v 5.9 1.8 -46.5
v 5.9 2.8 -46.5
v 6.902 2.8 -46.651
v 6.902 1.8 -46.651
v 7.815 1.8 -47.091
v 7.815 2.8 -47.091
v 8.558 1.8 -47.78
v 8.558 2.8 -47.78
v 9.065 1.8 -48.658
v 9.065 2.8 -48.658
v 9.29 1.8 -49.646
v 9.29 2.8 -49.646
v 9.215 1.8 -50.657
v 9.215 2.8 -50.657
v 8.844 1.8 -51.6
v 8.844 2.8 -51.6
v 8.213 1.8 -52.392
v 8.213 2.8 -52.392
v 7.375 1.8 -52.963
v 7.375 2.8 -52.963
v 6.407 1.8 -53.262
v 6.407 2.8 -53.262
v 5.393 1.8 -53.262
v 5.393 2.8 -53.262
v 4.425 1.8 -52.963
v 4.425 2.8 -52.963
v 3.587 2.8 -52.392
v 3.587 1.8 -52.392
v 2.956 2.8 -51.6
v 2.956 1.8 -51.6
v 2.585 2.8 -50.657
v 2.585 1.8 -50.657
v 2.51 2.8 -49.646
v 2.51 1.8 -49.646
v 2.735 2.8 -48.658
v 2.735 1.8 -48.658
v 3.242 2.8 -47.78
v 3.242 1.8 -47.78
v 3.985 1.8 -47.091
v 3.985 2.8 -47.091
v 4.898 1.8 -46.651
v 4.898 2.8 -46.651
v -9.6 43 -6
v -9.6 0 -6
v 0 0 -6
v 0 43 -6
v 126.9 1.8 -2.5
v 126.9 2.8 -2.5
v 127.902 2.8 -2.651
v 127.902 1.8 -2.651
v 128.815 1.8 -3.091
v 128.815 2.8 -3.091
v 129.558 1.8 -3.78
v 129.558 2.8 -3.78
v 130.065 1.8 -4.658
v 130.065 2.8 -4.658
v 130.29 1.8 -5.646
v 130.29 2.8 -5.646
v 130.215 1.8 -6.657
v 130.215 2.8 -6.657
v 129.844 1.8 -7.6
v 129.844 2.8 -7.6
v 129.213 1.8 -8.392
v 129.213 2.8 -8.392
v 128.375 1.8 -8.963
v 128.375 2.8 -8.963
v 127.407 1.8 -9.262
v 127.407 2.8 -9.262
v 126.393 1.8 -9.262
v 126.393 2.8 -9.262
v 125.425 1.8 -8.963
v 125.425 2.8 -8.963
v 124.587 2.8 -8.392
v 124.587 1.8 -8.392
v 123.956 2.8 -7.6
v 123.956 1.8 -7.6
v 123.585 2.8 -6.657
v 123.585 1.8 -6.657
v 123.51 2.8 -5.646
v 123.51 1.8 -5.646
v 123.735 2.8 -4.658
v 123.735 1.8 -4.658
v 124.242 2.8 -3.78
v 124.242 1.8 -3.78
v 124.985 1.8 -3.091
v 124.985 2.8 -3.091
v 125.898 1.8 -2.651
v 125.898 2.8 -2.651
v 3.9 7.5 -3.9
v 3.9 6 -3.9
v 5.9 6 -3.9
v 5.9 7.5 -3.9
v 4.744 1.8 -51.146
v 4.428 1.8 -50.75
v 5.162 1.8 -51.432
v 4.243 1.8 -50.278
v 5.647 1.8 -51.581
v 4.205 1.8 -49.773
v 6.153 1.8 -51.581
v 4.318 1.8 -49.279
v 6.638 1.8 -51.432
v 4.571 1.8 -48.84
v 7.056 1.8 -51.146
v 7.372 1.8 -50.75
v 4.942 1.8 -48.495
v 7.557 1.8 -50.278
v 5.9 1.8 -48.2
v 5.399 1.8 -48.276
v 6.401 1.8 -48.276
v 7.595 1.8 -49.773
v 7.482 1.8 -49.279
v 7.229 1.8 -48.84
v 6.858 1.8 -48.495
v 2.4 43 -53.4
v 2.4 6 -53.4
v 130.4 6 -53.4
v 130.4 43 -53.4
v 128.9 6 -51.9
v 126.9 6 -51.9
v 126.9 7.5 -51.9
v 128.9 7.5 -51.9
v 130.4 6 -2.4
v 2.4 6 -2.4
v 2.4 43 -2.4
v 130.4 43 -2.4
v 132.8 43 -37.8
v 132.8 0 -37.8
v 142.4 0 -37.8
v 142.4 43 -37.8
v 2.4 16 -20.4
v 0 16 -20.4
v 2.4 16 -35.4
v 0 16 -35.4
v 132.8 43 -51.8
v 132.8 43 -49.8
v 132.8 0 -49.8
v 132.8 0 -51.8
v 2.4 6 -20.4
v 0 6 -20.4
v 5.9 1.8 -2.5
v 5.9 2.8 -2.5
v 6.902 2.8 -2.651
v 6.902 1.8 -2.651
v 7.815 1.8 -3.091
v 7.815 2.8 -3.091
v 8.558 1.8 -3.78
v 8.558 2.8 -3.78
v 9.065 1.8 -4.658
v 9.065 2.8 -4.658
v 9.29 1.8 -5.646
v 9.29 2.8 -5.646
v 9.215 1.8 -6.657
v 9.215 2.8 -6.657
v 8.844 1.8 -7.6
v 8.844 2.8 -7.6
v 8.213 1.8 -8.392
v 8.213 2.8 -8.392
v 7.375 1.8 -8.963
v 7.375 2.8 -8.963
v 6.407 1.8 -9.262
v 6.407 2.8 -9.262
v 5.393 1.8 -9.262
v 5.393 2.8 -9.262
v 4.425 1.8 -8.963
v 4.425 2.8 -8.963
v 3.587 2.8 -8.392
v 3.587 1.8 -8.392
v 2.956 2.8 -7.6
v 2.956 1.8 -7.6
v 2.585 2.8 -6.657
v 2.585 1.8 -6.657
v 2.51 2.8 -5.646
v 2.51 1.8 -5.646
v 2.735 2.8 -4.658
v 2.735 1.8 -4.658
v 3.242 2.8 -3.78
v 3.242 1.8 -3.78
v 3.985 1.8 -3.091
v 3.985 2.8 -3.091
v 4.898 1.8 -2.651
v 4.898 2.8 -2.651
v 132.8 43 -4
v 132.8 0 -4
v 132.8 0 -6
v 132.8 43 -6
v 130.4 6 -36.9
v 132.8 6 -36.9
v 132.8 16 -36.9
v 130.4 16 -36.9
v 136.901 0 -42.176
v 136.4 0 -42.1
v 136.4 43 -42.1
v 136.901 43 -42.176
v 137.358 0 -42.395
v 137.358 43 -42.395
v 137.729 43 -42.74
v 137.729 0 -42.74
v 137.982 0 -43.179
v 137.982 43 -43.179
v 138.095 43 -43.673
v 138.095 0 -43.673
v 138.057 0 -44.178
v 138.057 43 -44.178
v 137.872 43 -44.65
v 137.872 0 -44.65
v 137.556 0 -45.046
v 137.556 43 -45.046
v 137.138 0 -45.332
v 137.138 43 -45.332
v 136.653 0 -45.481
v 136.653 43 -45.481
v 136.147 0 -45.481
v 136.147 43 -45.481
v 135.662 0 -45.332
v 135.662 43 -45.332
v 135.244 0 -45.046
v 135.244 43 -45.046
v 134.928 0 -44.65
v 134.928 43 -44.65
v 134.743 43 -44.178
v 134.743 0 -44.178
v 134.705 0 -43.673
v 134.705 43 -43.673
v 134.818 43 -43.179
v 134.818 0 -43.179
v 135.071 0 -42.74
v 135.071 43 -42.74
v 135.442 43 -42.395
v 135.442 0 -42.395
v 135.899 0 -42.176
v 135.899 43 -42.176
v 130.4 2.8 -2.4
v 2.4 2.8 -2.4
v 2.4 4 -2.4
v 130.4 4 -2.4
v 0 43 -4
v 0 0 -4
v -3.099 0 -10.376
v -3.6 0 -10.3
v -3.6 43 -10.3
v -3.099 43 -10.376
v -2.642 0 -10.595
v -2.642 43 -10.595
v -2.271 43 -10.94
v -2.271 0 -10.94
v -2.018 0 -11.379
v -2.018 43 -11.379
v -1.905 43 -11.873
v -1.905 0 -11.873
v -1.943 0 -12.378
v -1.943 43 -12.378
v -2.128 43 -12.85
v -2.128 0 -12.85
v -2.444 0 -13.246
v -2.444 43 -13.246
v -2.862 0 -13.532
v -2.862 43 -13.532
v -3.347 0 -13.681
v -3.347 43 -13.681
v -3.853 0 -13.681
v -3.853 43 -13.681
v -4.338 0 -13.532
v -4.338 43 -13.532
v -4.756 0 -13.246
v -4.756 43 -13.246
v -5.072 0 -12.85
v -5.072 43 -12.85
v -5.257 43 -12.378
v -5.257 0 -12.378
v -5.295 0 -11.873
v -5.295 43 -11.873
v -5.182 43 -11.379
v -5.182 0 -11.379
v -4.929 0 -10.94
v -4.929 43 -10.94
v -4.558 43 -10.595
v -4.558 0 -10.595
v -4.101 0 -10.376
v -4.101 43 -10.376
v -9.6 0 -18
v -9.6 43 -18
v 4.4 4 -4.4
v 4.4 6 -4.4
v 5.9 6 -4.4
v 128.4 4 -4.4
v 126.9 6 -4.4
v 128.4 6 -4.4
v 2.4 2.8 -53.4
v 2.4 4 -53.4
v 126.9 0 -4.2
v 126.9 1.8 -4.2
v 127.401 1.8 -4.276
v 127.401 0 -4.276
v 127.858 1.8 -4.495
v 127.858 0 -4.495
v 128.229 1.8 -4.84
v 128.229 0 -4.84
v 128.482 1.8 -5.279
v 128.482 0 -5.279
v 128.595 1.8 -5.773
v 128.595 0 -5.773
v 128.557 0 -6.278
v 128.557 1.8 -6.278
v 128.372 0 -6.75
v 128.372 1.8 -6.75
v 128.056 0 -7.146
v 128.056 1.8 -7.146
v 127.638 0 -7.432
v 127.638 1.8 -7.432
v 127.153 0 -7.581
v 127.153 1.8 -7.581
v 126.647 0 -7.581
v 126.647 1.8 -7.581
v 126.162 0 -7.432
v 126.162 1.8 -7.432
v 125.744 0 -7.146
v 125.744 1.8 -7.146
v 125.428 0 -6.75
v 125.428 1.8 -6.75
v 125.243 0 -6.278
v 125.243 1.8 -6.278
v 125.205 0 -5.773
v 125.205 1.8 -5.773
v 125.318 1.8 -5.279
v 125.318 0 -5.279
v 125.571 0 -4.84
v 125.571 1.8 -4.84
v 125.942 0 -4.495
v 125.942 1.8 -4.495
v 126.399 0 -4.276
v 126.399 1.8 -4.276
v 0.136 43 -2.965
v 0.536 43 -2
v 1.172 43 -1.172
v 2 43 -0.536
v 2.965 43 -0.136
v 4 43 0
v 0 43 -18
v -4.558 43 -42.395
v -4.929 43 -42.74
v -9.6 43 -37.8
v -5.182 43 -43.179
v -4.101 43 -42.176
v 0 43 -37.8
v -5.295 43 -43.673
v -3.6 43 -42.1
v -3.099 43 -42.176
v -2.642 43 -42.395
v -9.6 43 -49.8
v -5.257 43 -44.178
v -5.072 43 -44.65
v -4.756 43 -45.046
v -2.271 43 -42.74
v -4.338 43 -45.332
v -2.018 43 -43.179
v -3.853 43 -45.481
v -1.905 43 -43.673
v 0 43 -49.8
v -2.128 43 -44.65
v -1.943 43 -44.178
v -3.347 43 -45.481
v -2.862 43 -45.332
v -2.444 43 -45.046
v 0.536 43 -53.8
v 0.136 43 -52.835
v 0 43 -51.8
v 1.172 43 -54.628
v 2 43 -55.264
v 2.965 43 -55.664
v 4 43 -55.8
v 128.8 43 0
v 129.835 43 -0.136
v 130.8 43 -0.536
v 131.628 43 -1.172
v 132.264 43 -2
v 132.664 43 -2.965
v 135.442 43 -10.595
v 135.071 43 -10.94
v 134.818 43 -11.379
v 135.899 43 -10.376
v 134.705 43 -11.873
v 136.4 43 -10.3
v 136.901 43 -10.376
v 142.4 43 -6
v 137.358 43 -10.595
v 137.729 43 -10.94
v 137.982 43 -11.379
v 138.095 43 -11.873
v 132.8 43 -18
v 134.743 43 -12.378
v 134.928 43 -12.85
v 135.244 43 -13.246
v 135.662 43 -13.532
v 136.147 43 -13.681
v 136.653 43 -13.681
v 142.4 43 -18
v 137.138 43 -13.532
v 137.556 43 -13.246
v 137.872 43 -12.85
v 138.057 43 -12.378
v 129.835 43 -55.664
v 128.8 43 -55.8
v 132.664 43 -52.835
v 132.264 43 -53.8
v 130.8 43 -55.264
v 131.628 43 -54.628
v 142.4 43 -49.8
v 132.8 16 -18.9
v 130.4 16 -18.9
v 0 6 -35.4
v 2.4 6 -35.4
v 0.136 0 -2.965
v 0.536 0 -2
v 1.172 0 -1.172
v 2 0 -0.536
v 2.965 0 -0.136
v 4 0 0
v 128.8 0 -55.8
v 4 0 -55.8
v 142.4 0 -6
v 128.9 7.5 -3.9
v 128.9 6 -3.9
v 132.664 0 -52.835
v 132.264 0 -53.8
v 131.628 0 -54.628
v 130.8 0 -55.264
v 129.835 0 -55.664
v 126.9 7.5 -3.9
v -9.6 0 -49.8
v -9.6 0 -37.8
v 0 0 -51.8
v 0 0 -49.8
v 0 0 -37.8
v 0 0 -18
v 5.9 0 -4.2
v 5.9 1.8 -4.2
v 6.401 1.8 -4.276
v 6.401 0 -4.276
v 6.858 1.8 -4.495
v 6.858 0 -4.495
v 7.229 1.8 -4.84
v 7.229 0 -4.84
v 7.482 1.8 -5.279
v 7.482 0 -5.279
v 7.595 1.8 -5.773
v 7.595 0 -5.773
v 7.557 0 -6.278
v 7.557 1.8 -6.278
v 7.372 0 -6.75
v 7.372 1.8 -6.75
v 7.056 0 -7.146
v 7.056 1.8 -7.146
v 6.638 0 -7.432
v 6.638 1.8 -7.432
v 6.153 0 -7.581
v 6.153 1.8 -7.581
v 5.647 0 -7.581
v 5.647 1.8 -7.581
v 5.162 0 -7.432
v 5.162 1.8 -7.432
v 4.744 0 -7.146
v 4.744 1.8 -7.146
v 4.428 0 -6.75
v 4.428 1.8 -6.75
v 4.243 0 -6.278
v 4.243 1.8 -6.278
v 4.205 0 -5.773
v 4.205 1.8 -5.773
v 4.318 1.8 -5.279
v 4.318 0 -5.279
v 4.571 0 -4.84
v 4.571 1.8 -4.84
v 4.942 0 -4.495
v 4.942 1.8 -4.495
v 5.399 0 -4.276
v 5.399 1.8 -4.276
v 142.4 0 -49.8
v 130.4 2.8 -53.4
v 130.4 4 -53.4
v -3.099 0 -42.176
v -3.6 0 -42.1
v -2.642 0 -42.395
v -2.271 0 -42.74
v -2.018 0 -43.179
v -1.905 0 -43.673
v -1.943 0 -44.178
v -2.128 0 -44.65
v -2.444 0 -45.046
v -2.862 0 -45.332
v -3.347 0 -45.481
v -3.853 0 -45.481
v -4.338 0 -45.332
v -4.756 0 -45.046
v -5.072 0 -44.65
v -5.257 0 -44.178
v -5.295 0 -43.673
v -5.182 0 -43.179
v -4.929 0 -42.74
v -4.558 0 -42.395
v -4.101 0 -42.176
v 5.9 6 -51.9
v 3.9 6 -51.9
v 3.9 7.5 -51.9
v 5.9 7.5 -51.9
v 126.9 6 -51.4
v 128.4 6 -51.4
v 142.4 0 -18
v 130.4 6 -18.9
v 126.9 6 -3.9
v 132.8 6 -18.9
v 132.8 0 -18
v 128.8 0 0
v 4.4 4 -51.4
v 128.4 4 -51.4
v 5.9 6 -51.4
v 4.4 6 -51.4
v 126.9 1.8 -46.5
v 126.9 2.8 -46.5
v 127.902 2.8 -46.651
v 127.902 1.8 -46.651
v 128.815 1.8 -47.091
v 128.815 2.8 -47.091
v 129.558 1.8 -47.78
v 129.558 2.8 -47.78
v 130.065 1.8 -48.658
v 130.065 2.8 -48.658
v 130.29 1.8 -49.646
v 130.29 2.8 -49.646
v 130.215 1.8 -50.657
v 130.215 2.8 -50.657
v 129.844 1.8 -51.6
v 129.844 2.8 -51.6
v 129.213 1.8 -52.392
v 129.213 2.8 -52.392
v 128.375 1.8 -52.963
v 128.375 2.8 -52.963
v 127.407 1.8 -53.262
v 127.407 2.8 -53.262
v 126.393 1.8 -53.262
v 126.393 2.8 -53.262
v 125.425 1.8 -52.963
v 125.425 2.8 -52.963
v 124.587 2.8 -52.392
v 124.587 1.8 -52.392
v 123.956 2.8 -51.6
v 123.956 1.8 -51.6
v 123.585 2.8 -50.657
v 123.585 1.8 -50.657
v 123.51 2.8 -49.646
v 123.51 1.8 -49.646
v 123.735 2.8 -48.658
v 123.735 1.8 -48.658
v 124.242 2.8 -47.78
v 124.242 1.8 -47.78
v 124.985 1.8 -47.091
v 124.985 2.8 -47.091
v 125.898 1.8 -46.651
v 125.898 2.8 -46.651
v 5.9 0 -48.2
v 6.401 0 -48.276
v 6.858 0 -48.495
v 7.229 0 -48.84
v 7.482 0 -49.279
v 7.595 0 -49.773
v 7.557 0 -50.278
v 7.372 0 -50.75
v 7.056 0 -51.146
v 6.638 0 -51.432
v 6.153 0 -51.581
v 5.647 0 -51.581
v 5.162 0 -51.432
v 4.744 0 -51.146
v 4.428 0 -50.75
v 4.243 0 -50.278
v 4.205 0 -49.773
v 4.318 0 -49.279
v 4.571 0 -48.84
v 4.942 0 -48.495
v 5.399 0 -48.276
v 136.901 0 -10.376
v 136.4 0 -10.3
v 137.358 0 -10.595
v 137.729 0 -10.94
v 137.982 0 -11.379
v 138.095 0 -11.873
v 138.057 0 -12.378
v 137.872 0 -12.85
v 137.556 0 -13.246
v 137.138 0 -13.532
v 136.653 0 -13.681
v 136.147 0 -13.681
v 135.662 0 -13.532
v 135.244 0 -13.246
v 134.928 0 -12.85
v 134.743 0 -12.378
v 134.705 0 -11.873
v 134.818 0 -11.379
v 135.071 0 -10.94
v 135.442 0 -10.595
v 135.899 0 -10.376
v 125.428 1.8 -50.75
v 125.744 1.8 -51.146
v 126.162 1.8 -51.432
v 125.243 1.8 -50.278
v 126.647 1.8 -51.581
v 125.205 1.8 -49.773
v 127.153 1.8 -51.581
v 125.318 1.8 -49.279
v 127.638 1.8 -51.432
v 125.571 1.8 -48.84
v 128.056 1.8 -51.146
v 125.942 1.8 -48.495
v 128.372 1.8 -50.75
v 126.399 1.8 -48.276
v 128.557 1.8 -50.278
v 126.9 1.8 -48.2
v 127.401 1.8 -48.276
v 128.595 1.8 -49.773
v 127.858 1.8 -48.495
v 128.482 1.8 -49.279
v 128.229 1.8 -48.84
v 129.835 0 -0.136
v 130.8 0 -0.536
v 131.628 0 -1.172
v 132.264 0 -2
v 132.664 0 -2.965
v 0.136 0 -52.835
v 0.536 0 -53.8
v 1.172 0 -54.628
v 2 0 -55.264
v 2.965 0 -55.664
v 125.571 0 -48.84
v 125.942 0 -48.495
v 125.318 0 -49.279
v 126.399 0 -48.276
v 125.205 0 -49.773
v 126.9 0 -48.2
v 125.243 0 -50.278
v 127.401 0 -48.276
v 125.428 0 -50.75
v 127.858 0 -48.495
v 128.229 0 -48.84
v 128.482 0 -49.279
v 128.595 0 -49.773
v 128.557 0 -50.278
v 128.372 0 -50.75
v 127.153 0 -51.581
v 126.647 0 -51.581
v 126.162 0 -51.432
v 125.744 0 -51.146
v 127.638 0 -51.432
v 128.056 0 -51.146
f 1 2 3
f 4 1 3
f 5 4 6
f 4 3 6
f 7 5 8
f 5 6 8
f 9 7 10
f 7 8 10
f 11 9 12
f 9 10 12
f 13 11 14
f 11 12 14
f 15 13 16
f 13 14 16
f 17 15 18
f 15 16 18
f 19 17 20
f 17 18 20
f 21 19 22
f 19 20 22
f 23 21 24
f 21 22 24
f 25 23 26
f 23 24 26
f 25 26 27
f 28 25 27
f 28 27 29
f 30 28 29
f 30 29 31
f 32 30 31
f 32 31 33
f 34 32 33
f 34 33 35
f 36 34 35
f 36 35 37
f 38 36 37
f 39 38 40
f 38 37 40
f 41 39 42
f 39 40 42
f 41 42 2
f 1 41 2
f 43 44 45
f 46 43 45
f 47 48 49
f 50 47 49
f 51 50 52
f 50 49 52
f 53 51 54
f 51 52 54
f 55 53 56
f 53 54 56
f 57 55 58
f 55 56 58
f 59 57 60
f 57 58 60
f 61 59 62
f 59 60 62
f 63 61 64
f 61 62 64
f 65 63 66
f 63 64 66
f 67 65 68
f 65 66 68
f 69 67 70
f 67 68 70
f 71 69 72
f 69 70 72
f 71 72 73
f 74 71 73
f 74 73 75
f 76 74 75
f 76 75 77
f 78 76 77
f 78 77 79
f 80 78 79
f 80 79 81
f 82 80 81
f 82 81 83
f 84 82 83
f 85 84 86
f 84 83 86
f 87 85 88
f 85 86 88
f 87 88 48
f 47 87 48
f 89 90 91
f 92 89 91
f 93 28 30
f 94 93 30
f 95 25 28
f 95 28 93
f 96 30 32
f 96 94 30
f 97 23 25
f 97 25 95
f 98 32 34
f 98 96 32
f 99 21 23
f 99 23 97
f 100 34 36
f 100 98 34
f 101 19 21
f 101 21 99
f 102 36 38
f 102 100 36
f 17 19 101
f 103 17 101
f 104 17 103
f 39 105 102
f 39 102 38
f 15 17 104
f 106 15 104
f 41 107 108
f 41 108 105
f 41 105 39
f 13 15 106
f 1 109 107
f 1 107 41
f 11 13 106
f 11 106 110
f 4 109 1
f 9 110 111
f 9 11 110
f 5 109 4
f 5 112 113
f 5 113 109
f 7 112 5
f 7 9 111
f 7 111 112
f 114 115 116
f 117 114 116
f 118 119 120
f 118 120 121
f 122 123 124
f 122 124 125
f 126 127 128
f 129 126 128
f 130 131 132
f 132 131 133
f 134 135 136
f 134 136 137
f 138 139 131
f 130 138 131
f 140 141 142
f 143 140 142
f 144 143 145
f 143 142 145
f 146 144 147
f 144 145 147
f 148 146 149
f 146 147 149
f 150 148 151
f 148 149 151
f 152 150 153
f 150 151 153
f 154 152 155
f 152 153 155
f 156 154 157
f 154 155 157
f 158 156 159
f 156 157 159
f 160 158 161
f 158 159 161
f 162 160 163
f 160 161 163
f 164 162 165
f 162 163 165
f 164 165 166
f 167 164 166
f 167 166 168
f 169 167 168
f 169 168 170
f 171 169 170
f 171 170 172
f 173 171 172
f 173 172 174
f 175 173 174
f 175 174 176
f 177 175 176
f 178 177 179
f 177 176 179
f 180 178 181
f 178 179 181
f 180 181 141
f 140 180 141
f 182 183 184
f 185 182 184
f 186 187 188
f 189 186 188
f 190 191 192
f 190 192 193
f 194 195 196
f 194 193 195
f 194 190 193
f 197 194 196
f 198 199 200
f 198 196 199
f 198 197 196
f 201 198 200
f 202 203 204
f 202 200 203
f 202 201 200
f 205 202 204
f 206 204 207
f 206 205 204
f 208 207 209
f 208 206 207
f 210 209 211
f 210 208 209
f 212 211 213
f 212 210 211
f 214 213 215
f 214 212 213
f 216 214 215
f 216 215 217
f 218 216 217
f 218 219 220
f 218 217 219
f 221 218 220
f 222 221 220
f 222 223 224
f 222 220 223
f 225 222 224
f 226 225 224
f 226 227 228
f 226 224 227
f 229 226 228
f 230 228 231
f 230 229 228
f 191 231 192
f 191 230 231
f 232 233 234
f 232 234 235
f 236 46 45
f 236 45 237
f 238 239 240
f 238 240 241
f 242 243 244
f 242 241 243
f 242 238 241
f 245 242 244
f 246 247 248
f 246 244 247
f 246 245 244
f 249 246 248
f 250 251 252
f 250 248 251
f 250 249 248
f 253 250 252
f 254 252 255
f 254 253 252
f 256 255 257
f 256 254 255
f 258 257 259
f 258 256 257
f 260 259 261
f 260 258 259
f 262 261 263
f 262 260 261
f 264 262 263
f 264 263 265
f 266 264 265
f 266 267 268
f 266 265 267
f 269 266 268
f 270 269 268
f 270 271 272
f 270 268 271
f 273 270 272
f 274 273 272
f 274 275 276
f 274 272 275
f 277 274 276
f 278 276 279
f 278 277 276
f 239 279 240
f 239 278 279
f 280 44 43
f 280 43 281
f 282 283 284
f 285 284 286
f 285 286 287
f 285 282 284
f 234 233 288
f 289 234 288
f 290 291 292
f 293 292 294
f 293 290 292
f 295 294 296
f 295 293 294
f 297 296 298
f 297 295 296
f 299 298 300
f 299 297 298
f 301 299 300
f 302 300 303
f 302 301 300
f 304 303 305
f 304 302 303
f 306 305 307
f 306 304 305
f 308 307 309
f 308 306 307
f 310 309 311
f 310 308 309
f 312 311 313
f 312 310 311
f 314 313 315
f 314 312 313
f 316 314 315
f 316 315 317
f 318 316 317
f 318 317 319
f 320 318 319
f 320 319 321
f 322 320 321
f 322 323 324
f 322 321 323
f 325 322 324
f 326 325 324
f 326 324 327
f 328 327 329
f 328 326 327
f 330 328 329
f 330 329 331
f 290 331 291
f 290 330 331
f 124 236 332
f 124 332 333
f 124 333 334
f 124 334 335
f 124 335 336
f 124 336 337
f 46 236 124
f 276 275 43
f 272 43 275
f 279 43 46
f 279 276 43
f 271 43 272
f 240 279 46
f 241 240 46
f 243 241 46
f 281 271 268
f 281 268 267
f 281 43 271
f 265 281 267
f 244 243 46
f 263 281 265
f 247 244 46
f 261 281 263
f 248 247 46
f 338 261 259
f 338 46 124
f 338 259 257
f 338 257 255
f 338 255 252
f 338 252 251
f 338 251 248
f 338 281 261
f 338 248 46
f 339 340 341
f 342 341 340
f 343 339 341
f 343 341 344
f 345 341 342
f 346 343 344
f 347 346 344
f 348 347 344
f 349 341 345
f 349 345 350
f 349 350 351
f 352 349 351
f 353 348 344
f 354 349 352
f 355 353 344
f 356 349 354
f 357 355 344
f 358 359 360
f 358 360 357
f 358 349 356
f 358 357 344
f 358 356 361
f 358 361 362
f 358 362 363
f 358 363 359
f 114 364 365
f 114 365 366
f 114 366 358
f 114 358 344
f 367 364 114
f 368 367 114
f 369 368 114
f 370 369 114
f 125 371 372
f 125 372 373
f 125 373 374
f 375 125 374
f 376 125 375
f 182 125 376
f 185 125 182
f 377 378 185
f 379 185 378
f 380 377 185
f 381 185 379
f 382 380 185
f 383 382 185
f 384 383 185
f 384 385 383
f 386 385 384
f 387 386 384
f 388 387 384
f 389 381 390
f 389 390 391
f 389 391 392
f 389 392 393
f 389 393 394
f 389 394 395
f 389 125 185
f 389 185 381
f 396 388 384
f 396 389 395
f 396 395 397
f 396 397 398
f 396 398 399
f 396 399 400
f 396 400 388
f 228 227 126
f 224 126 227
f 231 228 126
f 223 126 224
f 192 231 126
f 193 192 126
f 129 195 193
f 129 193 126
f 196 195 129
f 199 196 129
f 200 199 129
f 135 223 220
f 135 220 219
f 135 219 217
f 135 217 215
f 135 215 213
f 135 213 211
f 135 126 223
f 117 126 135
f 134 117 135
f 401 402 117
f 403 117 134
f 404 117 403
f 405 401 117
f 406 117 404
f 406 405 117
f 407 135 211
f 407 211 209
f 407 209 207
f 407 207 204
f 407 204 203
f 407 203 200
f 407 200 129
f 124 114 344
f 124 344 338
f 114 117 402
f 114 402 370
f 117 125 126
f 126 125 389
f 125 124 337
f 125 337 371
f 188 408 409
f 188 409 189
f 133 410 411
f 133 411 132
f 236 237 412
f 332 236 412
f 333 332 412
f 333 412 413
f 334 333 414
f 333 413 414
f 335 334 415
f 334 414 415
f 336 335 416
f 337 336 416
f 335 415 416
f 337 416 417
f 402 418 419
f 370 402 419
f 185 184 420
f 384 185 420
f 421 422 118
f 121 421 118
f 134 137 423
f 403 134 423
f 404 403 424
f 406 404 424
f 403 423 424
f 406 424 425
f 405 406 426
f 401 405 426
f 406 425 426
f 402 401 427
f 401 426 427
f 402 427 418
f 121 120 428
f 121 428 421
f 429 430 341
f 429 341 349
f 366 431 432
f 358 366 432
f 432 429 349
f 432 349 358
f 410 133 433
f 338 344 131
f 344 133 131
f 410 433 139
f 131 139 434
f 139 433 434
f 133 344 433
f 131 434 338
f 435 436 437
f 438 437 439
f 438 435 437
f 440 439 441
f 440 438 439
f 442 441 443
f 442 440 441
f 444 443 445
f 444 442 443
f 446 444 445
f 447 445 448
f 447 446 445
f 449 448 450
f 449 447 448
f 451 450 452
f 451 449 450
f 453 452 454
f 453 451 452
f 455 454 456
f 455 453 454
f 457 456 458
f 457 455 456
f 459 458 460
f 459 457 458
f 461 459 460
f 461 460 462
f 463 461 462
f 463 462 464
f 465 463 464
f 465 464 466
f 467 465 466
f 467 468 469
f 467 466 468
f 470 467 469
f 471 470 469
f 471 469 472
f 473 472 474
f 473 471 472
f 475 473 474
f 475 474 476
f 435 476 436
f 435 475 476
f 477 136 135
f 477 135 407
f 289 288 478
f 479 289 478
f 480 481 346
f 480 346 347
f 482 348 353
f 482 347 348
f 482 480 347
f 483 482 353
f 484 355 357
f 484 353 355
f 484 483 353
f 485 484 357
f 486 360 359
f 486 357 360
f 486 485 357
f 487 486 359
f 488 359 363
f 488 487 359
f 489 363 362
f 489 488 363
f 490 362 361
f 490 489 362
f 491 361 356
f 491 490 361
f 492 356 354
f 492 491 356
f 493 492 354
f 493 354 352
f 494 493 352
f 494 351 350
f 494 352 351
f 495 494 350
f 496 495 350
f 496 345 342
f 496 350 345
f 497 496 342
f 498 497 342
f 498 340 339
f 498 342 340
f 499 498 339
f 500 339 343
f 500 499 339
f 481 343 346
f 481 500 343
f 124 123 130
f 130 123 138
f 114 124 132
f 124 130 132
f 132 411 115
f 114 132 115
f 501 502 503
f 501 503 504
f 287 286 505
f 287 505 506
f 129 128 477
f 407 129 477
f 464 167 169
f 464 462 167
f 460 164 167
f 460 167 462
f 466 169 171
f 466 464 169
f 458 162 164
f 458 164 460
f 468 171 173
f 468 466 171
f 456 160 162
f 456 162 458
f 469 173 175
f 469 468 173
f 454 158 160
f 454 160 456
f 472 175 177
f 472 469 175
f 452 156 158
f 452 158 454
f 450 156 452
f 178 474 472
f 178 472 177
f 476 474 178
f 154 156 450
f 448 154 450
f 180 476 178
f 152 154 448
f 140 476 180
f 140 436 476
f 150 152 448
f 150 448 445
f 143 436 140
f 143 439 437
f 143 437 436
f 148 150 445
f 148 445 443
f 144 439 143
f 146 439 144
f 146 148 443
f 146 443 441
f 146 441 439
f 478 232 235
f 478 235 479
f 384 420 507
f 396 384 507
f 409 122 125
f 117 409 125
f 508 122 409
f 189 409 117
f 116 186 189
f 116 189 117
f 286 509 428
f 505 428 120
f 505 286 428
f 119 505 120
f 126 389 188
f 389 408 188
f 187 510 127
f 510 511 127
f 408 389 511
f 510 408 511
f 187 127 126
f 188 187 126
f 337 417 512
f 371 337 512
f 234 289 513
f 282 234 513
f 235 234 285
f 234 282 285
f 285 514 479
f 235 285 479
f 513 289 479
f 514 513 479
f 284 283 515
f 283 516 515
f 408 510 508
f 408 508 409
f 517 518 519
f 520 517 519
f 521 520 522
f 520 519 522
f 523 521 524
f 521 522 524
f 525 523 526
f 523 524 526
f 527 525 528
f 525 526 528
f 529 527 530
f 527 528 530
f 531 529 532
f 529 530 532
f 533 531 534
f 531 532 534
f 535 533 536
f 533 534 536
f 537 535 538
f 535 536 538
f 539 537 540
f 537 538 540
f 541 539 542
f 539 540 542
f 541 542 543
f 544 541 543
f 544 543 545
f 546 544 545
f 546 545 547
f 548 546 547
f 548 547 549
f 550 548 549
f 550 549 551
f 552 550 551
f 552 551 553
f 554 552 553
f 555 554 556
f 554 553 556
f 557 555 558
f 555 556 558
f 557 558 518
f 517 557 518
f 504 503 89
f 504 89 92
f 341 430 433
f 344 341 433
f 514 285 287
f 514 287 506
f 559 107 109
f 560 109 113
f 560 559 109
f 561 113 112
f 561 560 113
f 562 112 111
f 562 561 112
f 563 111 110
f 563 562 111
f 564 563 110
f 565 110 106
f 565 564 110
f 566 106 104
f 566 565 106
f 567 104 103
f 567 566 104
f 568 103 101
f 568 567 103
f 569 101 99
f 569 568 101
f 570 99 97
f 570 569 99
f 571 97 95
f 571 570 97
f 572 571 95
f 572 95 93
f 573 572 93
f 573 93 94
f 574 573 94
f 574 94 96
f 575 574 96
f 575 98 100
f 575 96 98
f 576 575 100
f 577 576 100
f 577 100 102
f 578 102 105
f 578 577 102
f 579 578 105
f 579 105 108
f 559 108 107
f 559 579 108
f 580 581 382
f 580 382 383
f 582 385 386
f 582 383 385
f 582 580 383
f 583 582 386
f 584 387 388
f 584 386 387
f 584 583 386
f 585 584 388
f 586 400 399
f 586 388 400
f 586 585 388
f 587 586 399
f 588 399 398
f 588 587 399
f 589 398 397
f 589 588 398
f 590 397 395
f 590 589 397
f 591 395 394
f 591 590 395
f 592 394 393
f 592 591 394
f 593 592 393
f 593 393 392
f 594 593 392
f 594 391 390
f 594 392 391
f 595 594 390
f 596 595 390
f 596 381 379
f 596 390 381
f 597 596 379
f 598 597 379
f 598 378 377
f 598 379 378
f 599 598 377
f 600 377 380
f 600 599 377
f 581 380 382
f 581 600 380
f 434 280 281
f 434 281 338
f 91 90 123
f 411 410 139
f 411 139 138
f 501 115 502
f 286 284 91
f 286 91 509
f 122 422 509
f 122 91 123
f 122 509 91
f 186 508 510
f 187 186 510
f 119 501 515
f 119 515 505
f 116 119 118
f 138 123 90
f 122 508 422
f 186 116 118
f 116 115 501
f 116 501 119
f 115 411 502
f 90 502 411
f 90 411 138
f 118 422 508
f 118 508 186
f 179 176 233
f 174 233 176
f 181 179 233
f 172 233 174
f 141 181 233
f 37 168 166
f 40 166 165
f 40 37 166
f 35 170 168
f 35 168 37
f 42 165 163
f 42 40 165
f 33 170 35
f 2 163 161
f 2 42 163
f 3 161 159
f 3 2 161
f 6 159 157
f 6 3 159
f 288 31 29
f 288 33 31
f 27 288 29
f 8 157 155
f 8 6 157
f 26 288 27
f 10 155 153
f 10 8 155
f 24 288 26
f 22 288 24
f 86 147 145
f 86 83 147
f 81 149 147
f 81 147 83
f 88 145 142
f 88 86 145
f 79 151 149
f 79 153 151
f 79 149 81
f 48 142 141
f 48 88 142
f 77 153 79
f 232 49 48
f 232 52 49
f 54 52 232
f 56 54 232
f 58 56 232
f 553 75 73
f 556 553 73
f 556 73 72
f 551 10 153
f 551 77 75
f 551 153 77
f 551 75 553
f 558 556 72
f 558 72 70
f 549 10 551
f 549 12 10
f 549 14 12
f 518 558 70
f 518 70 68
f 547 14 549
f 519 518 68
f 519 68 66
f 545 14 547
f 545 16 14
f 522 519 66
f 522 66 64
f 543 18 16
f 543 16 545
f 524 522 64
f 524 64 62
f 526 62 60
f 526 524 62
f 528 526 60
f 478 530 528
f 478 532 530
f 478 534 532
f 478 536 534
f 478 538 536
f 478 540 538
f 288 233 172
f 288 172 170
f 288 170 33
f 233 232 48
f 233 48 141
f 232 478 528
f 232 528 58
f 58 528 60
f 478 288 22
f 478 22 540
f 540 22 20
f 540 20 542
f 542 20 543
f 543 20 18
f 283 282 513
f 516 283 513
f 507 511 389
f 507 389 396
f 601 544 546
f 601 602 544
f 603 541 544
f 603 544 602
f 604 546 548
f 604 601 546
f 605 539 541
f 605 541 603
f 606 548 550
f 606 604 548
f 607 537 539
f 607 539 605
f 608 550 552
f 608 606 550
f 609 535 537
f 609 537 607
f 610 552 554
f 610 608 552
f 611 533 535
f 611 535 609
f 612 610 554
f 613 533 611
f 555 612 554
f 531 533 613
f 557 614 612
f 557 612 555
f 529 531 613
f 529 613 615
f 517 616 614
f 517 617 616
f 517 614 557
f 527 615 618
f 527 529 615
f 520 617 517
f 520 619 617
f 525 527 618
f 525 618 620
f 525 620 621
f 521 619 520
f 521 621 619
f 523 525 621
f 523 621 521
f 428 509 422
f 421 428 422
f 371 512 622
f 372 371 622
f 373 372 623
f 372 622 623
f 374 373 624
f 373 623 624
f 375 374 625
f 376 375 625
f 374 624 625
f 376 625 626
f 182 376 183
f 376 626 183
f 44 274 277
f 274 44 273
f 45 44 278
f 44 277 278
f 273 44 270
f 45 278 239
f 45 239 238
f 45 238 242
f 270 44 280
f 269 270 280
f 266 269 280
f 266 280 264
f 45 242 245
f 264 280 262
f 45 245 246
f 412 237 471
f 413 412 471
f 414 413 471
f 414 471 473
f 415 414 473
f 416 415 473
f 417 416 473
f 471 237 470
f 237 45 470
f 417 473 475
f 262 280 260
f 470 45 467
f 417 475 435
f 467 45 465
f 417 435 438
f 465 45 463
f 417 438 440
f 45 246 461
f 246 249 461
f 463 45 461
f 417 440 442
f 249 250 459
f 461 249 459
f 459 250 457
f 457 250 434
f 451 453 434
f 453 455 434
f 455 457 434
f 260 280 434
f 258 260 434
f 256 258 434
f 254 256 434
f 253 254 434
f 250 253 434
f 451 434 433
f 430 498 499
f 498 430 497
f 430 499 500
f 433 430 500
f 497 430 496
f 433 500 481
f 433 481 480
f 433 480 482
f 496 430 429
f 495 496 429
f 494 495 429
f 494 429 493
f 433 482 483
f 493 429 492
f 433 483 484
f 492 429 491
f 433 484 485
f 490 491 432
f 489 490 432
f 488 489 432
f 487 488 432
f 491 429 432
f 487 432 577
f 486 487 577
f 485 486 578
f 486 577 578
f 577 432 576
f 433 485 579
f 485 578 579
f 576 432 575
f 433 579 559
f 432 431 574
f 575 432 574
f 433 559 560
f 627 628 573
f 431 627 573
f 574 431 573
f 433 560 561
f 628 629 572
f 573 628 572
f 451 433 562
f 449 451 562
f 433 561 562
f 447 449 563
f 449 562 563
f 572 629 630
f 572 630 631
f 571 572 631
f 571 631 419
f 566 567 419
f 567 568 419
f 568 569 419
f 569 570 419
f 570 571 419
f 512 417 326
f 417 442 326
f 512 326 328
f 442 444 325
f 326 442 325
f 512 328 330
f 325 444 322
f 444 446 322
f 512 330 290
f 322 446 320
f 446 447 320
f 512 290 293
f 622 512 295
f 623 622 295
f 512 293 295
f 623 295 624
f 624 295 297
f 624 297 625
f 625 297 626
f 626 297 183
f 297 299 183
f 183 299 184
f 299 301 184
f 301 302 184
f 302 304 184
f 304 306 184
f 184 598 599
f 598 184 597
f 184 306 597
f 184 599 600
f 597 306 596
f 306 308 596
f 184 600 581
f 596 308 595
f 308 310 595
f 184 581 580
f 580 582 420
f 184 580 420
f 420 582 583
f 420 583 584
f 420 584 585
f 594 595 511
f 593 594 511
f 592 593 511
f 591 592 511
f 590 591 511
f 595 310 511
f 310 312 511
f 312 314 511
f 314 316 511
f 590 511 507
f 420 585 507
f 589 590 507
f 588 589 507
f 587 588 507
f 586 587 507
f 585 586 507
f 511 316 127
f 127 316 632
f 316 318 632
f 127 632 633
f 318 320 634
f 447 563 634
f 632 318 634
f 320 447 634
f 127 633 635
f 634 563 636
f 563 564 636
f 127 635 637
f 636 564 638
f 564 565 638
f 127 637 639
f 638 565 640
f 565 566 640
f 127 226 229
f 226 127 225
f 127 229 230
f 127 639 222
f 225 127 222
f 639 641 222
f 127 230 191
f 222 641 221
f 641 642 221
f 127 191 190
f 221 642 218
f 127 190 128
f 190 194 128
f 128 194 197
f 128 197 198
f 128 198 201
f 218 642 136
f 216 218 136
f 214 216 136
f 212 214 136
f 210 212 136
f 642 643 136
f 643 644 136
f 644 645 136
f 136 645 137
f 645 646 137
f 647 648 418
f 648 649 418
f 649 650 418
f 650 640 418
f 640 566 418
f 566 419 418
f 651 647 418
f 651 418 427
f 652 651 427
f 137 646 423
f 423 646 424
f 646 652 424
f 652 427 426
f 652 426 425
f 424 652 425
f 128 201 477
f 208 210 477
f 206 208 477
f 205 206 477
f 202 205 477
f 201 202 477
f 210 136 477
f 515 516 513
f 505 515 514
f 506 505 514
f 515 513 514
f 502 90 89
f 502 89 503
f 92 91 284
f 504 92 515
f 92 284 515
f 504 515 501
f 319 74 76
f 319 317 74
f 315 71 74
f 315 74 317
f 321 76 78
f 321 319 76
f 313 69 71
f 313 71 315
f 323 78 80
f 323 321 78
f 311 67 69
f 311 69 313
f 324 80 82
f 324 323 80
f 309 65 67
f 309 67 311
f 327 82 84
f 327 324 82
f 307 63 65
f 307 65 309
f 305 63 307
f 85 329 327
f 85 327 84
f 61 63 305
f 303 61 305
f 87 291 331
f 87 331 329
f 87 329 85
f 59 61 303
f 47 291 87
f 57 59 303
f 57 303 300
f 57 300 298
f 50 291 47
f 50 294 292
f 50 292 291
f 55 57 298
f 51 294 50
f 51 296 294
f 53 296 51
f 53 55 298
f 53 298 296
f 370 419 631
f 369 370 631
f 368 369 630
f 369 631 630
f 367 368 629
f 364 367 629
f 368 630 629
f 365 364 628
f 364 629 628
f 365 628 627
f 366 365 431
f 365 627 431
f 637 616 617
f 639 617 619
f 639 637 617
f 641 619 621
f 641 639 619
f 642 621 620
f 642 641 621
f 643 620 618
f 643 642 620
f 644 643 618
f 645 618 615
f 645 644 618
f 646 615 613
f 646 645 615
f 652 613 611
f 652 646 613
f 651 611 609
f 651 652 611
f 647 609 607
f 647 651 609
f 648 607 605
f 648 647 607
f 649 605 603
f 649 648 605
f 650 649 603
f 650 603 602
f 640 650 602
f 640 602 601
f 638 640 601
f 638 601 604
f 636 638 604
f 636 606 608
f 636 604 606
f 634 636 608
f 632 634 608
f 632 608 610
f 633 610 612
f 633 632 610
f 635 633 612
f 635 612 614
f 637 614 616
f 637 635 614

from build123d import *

# Parameters (mm, degrees)
SHELL_DEPTH                       = 43
SK_TABS_W                         = 9.6
SK_TABS_H                         = 12
MOUNTING_TABS_DEPTH               = 43
SK_CAVITY_W                       = 128
SK_CAVITY_H                       = 51
CAVITY_DEPTH                      = 159.137408604
SK_LIP_W                          = 128
SK_LIP_H                          = 51
SK_LIP_W_2                        = 124
SK_LIP_H_2                        = 47
BOARD_LIP_DEPTH                   = 2
SK_RAILS_W                        = 2
SK_RAILS_H                        = 48
BOARD_RAILS_DEPTH                 = 1.5
SK_SLOTA_W                        = 15
SK_SLOTA_H                        = 10
CABLE_SLOT_15X10_DEPTH            = 3
SK_SLOTB_W                        = 18
SK_SLOTB_H                        = 10
CABLE_SLOT_18X10_DEPTH            = 3
TAB_M3_CLEARANCE_HOLES_DEPTH      = 159.872275744
TAB_M3_CLEARANCE_HOLES_DEPTH_BACK = 159.872275744
SK_TABHOLES_R                     = 1.7
SK_FLOORHOLES_R                   = 1.7
FLOOR_M3_CLEARANCE_HOLES_DEPTH    = 2.8
SK_CBORE_R                        = 3.4
FLOOR_COUNTERBORES_DEPTH          = 1


with BuildPart() as part:
    # Sk_Shell → Shell (new body)
    with BuildSketch(Plane(origin=(0, 0, 0), x_dir=(1, 0, 0), z_dir=(0, 1, 0))):
        with BuildLine():
            Line((4, 0), (128.8, 0))
            ThreePointArc((128.8, 0), (131.628427125, 1.171572875), (132.8, 4))
            Line((132.8, 4), (132.8, 51.8))
            ThreePointArc((132.8, 51.8), (131.628427125, 54.628427125), (128.8, 55.8))
            Line((128.8, 55.8), (4, 55.8))
            ThreePointArc((4, 55.8), (1.171572875, 54.628427125), (0, 51.8))
            Line((0, 51.8), (0, 4))
            ThreePointArc((0, 4), (1.171572875, 1.171572875), (4, 0))
        make_face()
    extrude(amount=SHELL_DEPTH)

    # Sk_Tabs → Mounting Tabs (add)
    with BuildSketch(Plane(origin=(0, 0, 0), x_dir=(1, 0, 0), z_dir=(0, 1, 0))):
        with Locations((-4.8, 12)):
            Rectangle(SK_TABS_W, SK_TABS_H)
        with Locations((137.6, 12)):
            Rectangle(SK_TABS_W, SK_TABS_H)
        with Locations((-4.8, 43.8)):
            Rectangle(SK_TABS_W, SK_TABS_H)
        with Locations((137.6, 43.8)):
            Rectangle(SK_TABS_W, SK_TABS_H)
    extrude(amount=MOUNTING_TABS_DEPTH)

    # Sk_Cavity → Cavity (cut, through all)
    with BuildSketch(Plane(origin=(0, 2.8, 0), x_dir=(1, 0, 0), z_dir=(0, 1, 0))):
        with Locations((66.4, 27.9)):
            Rectangle(SK_CAVITY_W, SK_CAVITY_H)
    extrude(amount=CAVITY_DEPTH, mode=Mode.SUBTRACT)

    # Sk_Lip → Board Lip (add)
    with BuildSketch(Plane(origin=(0, 4, 0), x_dir=(1, 0, 0), z_dir=(0, 1, 0))):
        with Locations((66.4, 27.9)):
            Rectangle(SK_LIP_W, SK_LIP_H)
        with Locations((66.4, 27.9)):
            Rectangle(SK_LIP_W_2, SK_LIP_H_2, mode=Mode.SUBTRACT)
    extrude(amount=BOARD_LIP_DEPTH)

    # Sk_Rails → Board Rails (add)
    with BuildSketch(Plane(origin=(0, 6, 0), x_dir=(1, 0, 0), z_dir=(0, 1, 0))):
        with Locations((4.9, 27.9)):
            Rectangle(SK_RAILS_W, SK_RAILS_H)
        with Locations((127.9, 27.9)):
            Rectangle(SK_RAILS_W, SK_RAILS_H)
    extrude(amount=BOARD_RAILS_DEPTH)

    # Sk_SlotA → Cable Slot 15x10 (cut)
    with BuildSketch(Plane(origin=(0, 0, 0), x_dir=(0, 0, -1), z_dir=(1, 0, 0))):
        with Locations((27.9, 11)):
            Rectangle(SK_SLOTA_W, SK_SLOTA_H)
    extrude(amount=CABLE_SLOT_15X10_DEPTH, mode=Mode.SUBTRACT)

    # Sk_SlotB → Cable Slot 18x10 (cut)
    with BuildSketch(Plane(origin=(132.8, 0, 0), x_dir=(0, 0, -1), z_dir=(1, 0, 0))):
        with Locations((27.9, 11)):
            Rectangle(SK_SLOTB_W, SK_SLOTB_H)
    extrude(amount=-CABLE_SLOT_18X10_DEPTH, mode=Mode.SUBTRACT)

    # Sk_TabHoles → Tab M3 Clearance Holes (cut, two sides: drawn at the far end of the back side and taken through both)
    with BuildSketch(Plane(origin=(0, 0, 0), x_dir=(1, 0, 0), z_dir=(0, 1, 0)).offset(-TAB_M3_CLEARANCE_HOLES_DEPTH_BACK)):
        with Locations(Location((-3.6, 12, 0), (0, 0, 270))):
            Circle(SK_TABHOLES_R)
        with Locations(Location((-3.6, 43.8, 0), (0, 0, 270))):
            Circle(SK_TABHOLES_R)
        with Locations(Location((136.4, 12, 0), (0, 0, 270))):
            Circle(SK_TABHOLES_R)
        with Locations(Location((136.4, 43.8, 0), (0, 0, 270))):
            Circle(SK_TABHOLES_R)
    extrude(amount=TAB_M3_CLEARANCE_HOLES_DEPTH + TAB_M3_CLEARANCE_HOLES_DEPTH_BACK, mode=Mode.SUBTRACT)

    # Sk_FloorHoles → Floor M3 Clearance Holes (cut)
    with BuildSketch(Plane(origin=(0, 0, 0), x_dir=(1, 0, 0), z_dir=(0, 1, 0))):
        with Locations(Location((5.9, 5.9, 0), (0, 0, 270))):
            Circle(SK_FLOORHOLES_R)
        with Locations(Location((126.9, 5.9, 0), (0, 0, 270))):
            Circle(SK_FLOORHOLES_R)
        with Locations(Location((5.9, 49.9, 0), (0, 0, 270))):
            Circle(SK_FLOORHOLES_R)
        with Locations(Location((126.9, 49.9, 0), (0, 0, 270))):
            Circle(SK_FLOORHOLES_R)
    extrude(amount=FLOOR_M3_CLEARANCE_HOLES_DEPTH, mode=Mode.SUBTRACT)

    # Sk_CBore → Floor Counterbores (cut)
    with BuildSketch(Plane(origin=(0, 2.8, 0), x_dir=(1, 0, 0), z_dir=(0, 1, 0))):
        with Locations(Location((5.9, 5.9, 0), (0, 0, 270))):
            Circle(SK_CBORE_R)
        with Locations(Location((126.9, 5.9, 0), (0, 0, 270))):
            Circle(SK_CBORE_R)
        with Locations(Location((5.9, 49.9, 0), (0, 0, 270))):
            Circle(SK_CBORE_R)
        with Locations(Location((126.9, 49.9, 0), (0, 0, 270))):
            Circle(SK_CBORE_R)
    extrude(amount=-FLOOR_COUNTERBORES_DEPTH, mode=Mode.SUBTRACT)


solid = part.part
